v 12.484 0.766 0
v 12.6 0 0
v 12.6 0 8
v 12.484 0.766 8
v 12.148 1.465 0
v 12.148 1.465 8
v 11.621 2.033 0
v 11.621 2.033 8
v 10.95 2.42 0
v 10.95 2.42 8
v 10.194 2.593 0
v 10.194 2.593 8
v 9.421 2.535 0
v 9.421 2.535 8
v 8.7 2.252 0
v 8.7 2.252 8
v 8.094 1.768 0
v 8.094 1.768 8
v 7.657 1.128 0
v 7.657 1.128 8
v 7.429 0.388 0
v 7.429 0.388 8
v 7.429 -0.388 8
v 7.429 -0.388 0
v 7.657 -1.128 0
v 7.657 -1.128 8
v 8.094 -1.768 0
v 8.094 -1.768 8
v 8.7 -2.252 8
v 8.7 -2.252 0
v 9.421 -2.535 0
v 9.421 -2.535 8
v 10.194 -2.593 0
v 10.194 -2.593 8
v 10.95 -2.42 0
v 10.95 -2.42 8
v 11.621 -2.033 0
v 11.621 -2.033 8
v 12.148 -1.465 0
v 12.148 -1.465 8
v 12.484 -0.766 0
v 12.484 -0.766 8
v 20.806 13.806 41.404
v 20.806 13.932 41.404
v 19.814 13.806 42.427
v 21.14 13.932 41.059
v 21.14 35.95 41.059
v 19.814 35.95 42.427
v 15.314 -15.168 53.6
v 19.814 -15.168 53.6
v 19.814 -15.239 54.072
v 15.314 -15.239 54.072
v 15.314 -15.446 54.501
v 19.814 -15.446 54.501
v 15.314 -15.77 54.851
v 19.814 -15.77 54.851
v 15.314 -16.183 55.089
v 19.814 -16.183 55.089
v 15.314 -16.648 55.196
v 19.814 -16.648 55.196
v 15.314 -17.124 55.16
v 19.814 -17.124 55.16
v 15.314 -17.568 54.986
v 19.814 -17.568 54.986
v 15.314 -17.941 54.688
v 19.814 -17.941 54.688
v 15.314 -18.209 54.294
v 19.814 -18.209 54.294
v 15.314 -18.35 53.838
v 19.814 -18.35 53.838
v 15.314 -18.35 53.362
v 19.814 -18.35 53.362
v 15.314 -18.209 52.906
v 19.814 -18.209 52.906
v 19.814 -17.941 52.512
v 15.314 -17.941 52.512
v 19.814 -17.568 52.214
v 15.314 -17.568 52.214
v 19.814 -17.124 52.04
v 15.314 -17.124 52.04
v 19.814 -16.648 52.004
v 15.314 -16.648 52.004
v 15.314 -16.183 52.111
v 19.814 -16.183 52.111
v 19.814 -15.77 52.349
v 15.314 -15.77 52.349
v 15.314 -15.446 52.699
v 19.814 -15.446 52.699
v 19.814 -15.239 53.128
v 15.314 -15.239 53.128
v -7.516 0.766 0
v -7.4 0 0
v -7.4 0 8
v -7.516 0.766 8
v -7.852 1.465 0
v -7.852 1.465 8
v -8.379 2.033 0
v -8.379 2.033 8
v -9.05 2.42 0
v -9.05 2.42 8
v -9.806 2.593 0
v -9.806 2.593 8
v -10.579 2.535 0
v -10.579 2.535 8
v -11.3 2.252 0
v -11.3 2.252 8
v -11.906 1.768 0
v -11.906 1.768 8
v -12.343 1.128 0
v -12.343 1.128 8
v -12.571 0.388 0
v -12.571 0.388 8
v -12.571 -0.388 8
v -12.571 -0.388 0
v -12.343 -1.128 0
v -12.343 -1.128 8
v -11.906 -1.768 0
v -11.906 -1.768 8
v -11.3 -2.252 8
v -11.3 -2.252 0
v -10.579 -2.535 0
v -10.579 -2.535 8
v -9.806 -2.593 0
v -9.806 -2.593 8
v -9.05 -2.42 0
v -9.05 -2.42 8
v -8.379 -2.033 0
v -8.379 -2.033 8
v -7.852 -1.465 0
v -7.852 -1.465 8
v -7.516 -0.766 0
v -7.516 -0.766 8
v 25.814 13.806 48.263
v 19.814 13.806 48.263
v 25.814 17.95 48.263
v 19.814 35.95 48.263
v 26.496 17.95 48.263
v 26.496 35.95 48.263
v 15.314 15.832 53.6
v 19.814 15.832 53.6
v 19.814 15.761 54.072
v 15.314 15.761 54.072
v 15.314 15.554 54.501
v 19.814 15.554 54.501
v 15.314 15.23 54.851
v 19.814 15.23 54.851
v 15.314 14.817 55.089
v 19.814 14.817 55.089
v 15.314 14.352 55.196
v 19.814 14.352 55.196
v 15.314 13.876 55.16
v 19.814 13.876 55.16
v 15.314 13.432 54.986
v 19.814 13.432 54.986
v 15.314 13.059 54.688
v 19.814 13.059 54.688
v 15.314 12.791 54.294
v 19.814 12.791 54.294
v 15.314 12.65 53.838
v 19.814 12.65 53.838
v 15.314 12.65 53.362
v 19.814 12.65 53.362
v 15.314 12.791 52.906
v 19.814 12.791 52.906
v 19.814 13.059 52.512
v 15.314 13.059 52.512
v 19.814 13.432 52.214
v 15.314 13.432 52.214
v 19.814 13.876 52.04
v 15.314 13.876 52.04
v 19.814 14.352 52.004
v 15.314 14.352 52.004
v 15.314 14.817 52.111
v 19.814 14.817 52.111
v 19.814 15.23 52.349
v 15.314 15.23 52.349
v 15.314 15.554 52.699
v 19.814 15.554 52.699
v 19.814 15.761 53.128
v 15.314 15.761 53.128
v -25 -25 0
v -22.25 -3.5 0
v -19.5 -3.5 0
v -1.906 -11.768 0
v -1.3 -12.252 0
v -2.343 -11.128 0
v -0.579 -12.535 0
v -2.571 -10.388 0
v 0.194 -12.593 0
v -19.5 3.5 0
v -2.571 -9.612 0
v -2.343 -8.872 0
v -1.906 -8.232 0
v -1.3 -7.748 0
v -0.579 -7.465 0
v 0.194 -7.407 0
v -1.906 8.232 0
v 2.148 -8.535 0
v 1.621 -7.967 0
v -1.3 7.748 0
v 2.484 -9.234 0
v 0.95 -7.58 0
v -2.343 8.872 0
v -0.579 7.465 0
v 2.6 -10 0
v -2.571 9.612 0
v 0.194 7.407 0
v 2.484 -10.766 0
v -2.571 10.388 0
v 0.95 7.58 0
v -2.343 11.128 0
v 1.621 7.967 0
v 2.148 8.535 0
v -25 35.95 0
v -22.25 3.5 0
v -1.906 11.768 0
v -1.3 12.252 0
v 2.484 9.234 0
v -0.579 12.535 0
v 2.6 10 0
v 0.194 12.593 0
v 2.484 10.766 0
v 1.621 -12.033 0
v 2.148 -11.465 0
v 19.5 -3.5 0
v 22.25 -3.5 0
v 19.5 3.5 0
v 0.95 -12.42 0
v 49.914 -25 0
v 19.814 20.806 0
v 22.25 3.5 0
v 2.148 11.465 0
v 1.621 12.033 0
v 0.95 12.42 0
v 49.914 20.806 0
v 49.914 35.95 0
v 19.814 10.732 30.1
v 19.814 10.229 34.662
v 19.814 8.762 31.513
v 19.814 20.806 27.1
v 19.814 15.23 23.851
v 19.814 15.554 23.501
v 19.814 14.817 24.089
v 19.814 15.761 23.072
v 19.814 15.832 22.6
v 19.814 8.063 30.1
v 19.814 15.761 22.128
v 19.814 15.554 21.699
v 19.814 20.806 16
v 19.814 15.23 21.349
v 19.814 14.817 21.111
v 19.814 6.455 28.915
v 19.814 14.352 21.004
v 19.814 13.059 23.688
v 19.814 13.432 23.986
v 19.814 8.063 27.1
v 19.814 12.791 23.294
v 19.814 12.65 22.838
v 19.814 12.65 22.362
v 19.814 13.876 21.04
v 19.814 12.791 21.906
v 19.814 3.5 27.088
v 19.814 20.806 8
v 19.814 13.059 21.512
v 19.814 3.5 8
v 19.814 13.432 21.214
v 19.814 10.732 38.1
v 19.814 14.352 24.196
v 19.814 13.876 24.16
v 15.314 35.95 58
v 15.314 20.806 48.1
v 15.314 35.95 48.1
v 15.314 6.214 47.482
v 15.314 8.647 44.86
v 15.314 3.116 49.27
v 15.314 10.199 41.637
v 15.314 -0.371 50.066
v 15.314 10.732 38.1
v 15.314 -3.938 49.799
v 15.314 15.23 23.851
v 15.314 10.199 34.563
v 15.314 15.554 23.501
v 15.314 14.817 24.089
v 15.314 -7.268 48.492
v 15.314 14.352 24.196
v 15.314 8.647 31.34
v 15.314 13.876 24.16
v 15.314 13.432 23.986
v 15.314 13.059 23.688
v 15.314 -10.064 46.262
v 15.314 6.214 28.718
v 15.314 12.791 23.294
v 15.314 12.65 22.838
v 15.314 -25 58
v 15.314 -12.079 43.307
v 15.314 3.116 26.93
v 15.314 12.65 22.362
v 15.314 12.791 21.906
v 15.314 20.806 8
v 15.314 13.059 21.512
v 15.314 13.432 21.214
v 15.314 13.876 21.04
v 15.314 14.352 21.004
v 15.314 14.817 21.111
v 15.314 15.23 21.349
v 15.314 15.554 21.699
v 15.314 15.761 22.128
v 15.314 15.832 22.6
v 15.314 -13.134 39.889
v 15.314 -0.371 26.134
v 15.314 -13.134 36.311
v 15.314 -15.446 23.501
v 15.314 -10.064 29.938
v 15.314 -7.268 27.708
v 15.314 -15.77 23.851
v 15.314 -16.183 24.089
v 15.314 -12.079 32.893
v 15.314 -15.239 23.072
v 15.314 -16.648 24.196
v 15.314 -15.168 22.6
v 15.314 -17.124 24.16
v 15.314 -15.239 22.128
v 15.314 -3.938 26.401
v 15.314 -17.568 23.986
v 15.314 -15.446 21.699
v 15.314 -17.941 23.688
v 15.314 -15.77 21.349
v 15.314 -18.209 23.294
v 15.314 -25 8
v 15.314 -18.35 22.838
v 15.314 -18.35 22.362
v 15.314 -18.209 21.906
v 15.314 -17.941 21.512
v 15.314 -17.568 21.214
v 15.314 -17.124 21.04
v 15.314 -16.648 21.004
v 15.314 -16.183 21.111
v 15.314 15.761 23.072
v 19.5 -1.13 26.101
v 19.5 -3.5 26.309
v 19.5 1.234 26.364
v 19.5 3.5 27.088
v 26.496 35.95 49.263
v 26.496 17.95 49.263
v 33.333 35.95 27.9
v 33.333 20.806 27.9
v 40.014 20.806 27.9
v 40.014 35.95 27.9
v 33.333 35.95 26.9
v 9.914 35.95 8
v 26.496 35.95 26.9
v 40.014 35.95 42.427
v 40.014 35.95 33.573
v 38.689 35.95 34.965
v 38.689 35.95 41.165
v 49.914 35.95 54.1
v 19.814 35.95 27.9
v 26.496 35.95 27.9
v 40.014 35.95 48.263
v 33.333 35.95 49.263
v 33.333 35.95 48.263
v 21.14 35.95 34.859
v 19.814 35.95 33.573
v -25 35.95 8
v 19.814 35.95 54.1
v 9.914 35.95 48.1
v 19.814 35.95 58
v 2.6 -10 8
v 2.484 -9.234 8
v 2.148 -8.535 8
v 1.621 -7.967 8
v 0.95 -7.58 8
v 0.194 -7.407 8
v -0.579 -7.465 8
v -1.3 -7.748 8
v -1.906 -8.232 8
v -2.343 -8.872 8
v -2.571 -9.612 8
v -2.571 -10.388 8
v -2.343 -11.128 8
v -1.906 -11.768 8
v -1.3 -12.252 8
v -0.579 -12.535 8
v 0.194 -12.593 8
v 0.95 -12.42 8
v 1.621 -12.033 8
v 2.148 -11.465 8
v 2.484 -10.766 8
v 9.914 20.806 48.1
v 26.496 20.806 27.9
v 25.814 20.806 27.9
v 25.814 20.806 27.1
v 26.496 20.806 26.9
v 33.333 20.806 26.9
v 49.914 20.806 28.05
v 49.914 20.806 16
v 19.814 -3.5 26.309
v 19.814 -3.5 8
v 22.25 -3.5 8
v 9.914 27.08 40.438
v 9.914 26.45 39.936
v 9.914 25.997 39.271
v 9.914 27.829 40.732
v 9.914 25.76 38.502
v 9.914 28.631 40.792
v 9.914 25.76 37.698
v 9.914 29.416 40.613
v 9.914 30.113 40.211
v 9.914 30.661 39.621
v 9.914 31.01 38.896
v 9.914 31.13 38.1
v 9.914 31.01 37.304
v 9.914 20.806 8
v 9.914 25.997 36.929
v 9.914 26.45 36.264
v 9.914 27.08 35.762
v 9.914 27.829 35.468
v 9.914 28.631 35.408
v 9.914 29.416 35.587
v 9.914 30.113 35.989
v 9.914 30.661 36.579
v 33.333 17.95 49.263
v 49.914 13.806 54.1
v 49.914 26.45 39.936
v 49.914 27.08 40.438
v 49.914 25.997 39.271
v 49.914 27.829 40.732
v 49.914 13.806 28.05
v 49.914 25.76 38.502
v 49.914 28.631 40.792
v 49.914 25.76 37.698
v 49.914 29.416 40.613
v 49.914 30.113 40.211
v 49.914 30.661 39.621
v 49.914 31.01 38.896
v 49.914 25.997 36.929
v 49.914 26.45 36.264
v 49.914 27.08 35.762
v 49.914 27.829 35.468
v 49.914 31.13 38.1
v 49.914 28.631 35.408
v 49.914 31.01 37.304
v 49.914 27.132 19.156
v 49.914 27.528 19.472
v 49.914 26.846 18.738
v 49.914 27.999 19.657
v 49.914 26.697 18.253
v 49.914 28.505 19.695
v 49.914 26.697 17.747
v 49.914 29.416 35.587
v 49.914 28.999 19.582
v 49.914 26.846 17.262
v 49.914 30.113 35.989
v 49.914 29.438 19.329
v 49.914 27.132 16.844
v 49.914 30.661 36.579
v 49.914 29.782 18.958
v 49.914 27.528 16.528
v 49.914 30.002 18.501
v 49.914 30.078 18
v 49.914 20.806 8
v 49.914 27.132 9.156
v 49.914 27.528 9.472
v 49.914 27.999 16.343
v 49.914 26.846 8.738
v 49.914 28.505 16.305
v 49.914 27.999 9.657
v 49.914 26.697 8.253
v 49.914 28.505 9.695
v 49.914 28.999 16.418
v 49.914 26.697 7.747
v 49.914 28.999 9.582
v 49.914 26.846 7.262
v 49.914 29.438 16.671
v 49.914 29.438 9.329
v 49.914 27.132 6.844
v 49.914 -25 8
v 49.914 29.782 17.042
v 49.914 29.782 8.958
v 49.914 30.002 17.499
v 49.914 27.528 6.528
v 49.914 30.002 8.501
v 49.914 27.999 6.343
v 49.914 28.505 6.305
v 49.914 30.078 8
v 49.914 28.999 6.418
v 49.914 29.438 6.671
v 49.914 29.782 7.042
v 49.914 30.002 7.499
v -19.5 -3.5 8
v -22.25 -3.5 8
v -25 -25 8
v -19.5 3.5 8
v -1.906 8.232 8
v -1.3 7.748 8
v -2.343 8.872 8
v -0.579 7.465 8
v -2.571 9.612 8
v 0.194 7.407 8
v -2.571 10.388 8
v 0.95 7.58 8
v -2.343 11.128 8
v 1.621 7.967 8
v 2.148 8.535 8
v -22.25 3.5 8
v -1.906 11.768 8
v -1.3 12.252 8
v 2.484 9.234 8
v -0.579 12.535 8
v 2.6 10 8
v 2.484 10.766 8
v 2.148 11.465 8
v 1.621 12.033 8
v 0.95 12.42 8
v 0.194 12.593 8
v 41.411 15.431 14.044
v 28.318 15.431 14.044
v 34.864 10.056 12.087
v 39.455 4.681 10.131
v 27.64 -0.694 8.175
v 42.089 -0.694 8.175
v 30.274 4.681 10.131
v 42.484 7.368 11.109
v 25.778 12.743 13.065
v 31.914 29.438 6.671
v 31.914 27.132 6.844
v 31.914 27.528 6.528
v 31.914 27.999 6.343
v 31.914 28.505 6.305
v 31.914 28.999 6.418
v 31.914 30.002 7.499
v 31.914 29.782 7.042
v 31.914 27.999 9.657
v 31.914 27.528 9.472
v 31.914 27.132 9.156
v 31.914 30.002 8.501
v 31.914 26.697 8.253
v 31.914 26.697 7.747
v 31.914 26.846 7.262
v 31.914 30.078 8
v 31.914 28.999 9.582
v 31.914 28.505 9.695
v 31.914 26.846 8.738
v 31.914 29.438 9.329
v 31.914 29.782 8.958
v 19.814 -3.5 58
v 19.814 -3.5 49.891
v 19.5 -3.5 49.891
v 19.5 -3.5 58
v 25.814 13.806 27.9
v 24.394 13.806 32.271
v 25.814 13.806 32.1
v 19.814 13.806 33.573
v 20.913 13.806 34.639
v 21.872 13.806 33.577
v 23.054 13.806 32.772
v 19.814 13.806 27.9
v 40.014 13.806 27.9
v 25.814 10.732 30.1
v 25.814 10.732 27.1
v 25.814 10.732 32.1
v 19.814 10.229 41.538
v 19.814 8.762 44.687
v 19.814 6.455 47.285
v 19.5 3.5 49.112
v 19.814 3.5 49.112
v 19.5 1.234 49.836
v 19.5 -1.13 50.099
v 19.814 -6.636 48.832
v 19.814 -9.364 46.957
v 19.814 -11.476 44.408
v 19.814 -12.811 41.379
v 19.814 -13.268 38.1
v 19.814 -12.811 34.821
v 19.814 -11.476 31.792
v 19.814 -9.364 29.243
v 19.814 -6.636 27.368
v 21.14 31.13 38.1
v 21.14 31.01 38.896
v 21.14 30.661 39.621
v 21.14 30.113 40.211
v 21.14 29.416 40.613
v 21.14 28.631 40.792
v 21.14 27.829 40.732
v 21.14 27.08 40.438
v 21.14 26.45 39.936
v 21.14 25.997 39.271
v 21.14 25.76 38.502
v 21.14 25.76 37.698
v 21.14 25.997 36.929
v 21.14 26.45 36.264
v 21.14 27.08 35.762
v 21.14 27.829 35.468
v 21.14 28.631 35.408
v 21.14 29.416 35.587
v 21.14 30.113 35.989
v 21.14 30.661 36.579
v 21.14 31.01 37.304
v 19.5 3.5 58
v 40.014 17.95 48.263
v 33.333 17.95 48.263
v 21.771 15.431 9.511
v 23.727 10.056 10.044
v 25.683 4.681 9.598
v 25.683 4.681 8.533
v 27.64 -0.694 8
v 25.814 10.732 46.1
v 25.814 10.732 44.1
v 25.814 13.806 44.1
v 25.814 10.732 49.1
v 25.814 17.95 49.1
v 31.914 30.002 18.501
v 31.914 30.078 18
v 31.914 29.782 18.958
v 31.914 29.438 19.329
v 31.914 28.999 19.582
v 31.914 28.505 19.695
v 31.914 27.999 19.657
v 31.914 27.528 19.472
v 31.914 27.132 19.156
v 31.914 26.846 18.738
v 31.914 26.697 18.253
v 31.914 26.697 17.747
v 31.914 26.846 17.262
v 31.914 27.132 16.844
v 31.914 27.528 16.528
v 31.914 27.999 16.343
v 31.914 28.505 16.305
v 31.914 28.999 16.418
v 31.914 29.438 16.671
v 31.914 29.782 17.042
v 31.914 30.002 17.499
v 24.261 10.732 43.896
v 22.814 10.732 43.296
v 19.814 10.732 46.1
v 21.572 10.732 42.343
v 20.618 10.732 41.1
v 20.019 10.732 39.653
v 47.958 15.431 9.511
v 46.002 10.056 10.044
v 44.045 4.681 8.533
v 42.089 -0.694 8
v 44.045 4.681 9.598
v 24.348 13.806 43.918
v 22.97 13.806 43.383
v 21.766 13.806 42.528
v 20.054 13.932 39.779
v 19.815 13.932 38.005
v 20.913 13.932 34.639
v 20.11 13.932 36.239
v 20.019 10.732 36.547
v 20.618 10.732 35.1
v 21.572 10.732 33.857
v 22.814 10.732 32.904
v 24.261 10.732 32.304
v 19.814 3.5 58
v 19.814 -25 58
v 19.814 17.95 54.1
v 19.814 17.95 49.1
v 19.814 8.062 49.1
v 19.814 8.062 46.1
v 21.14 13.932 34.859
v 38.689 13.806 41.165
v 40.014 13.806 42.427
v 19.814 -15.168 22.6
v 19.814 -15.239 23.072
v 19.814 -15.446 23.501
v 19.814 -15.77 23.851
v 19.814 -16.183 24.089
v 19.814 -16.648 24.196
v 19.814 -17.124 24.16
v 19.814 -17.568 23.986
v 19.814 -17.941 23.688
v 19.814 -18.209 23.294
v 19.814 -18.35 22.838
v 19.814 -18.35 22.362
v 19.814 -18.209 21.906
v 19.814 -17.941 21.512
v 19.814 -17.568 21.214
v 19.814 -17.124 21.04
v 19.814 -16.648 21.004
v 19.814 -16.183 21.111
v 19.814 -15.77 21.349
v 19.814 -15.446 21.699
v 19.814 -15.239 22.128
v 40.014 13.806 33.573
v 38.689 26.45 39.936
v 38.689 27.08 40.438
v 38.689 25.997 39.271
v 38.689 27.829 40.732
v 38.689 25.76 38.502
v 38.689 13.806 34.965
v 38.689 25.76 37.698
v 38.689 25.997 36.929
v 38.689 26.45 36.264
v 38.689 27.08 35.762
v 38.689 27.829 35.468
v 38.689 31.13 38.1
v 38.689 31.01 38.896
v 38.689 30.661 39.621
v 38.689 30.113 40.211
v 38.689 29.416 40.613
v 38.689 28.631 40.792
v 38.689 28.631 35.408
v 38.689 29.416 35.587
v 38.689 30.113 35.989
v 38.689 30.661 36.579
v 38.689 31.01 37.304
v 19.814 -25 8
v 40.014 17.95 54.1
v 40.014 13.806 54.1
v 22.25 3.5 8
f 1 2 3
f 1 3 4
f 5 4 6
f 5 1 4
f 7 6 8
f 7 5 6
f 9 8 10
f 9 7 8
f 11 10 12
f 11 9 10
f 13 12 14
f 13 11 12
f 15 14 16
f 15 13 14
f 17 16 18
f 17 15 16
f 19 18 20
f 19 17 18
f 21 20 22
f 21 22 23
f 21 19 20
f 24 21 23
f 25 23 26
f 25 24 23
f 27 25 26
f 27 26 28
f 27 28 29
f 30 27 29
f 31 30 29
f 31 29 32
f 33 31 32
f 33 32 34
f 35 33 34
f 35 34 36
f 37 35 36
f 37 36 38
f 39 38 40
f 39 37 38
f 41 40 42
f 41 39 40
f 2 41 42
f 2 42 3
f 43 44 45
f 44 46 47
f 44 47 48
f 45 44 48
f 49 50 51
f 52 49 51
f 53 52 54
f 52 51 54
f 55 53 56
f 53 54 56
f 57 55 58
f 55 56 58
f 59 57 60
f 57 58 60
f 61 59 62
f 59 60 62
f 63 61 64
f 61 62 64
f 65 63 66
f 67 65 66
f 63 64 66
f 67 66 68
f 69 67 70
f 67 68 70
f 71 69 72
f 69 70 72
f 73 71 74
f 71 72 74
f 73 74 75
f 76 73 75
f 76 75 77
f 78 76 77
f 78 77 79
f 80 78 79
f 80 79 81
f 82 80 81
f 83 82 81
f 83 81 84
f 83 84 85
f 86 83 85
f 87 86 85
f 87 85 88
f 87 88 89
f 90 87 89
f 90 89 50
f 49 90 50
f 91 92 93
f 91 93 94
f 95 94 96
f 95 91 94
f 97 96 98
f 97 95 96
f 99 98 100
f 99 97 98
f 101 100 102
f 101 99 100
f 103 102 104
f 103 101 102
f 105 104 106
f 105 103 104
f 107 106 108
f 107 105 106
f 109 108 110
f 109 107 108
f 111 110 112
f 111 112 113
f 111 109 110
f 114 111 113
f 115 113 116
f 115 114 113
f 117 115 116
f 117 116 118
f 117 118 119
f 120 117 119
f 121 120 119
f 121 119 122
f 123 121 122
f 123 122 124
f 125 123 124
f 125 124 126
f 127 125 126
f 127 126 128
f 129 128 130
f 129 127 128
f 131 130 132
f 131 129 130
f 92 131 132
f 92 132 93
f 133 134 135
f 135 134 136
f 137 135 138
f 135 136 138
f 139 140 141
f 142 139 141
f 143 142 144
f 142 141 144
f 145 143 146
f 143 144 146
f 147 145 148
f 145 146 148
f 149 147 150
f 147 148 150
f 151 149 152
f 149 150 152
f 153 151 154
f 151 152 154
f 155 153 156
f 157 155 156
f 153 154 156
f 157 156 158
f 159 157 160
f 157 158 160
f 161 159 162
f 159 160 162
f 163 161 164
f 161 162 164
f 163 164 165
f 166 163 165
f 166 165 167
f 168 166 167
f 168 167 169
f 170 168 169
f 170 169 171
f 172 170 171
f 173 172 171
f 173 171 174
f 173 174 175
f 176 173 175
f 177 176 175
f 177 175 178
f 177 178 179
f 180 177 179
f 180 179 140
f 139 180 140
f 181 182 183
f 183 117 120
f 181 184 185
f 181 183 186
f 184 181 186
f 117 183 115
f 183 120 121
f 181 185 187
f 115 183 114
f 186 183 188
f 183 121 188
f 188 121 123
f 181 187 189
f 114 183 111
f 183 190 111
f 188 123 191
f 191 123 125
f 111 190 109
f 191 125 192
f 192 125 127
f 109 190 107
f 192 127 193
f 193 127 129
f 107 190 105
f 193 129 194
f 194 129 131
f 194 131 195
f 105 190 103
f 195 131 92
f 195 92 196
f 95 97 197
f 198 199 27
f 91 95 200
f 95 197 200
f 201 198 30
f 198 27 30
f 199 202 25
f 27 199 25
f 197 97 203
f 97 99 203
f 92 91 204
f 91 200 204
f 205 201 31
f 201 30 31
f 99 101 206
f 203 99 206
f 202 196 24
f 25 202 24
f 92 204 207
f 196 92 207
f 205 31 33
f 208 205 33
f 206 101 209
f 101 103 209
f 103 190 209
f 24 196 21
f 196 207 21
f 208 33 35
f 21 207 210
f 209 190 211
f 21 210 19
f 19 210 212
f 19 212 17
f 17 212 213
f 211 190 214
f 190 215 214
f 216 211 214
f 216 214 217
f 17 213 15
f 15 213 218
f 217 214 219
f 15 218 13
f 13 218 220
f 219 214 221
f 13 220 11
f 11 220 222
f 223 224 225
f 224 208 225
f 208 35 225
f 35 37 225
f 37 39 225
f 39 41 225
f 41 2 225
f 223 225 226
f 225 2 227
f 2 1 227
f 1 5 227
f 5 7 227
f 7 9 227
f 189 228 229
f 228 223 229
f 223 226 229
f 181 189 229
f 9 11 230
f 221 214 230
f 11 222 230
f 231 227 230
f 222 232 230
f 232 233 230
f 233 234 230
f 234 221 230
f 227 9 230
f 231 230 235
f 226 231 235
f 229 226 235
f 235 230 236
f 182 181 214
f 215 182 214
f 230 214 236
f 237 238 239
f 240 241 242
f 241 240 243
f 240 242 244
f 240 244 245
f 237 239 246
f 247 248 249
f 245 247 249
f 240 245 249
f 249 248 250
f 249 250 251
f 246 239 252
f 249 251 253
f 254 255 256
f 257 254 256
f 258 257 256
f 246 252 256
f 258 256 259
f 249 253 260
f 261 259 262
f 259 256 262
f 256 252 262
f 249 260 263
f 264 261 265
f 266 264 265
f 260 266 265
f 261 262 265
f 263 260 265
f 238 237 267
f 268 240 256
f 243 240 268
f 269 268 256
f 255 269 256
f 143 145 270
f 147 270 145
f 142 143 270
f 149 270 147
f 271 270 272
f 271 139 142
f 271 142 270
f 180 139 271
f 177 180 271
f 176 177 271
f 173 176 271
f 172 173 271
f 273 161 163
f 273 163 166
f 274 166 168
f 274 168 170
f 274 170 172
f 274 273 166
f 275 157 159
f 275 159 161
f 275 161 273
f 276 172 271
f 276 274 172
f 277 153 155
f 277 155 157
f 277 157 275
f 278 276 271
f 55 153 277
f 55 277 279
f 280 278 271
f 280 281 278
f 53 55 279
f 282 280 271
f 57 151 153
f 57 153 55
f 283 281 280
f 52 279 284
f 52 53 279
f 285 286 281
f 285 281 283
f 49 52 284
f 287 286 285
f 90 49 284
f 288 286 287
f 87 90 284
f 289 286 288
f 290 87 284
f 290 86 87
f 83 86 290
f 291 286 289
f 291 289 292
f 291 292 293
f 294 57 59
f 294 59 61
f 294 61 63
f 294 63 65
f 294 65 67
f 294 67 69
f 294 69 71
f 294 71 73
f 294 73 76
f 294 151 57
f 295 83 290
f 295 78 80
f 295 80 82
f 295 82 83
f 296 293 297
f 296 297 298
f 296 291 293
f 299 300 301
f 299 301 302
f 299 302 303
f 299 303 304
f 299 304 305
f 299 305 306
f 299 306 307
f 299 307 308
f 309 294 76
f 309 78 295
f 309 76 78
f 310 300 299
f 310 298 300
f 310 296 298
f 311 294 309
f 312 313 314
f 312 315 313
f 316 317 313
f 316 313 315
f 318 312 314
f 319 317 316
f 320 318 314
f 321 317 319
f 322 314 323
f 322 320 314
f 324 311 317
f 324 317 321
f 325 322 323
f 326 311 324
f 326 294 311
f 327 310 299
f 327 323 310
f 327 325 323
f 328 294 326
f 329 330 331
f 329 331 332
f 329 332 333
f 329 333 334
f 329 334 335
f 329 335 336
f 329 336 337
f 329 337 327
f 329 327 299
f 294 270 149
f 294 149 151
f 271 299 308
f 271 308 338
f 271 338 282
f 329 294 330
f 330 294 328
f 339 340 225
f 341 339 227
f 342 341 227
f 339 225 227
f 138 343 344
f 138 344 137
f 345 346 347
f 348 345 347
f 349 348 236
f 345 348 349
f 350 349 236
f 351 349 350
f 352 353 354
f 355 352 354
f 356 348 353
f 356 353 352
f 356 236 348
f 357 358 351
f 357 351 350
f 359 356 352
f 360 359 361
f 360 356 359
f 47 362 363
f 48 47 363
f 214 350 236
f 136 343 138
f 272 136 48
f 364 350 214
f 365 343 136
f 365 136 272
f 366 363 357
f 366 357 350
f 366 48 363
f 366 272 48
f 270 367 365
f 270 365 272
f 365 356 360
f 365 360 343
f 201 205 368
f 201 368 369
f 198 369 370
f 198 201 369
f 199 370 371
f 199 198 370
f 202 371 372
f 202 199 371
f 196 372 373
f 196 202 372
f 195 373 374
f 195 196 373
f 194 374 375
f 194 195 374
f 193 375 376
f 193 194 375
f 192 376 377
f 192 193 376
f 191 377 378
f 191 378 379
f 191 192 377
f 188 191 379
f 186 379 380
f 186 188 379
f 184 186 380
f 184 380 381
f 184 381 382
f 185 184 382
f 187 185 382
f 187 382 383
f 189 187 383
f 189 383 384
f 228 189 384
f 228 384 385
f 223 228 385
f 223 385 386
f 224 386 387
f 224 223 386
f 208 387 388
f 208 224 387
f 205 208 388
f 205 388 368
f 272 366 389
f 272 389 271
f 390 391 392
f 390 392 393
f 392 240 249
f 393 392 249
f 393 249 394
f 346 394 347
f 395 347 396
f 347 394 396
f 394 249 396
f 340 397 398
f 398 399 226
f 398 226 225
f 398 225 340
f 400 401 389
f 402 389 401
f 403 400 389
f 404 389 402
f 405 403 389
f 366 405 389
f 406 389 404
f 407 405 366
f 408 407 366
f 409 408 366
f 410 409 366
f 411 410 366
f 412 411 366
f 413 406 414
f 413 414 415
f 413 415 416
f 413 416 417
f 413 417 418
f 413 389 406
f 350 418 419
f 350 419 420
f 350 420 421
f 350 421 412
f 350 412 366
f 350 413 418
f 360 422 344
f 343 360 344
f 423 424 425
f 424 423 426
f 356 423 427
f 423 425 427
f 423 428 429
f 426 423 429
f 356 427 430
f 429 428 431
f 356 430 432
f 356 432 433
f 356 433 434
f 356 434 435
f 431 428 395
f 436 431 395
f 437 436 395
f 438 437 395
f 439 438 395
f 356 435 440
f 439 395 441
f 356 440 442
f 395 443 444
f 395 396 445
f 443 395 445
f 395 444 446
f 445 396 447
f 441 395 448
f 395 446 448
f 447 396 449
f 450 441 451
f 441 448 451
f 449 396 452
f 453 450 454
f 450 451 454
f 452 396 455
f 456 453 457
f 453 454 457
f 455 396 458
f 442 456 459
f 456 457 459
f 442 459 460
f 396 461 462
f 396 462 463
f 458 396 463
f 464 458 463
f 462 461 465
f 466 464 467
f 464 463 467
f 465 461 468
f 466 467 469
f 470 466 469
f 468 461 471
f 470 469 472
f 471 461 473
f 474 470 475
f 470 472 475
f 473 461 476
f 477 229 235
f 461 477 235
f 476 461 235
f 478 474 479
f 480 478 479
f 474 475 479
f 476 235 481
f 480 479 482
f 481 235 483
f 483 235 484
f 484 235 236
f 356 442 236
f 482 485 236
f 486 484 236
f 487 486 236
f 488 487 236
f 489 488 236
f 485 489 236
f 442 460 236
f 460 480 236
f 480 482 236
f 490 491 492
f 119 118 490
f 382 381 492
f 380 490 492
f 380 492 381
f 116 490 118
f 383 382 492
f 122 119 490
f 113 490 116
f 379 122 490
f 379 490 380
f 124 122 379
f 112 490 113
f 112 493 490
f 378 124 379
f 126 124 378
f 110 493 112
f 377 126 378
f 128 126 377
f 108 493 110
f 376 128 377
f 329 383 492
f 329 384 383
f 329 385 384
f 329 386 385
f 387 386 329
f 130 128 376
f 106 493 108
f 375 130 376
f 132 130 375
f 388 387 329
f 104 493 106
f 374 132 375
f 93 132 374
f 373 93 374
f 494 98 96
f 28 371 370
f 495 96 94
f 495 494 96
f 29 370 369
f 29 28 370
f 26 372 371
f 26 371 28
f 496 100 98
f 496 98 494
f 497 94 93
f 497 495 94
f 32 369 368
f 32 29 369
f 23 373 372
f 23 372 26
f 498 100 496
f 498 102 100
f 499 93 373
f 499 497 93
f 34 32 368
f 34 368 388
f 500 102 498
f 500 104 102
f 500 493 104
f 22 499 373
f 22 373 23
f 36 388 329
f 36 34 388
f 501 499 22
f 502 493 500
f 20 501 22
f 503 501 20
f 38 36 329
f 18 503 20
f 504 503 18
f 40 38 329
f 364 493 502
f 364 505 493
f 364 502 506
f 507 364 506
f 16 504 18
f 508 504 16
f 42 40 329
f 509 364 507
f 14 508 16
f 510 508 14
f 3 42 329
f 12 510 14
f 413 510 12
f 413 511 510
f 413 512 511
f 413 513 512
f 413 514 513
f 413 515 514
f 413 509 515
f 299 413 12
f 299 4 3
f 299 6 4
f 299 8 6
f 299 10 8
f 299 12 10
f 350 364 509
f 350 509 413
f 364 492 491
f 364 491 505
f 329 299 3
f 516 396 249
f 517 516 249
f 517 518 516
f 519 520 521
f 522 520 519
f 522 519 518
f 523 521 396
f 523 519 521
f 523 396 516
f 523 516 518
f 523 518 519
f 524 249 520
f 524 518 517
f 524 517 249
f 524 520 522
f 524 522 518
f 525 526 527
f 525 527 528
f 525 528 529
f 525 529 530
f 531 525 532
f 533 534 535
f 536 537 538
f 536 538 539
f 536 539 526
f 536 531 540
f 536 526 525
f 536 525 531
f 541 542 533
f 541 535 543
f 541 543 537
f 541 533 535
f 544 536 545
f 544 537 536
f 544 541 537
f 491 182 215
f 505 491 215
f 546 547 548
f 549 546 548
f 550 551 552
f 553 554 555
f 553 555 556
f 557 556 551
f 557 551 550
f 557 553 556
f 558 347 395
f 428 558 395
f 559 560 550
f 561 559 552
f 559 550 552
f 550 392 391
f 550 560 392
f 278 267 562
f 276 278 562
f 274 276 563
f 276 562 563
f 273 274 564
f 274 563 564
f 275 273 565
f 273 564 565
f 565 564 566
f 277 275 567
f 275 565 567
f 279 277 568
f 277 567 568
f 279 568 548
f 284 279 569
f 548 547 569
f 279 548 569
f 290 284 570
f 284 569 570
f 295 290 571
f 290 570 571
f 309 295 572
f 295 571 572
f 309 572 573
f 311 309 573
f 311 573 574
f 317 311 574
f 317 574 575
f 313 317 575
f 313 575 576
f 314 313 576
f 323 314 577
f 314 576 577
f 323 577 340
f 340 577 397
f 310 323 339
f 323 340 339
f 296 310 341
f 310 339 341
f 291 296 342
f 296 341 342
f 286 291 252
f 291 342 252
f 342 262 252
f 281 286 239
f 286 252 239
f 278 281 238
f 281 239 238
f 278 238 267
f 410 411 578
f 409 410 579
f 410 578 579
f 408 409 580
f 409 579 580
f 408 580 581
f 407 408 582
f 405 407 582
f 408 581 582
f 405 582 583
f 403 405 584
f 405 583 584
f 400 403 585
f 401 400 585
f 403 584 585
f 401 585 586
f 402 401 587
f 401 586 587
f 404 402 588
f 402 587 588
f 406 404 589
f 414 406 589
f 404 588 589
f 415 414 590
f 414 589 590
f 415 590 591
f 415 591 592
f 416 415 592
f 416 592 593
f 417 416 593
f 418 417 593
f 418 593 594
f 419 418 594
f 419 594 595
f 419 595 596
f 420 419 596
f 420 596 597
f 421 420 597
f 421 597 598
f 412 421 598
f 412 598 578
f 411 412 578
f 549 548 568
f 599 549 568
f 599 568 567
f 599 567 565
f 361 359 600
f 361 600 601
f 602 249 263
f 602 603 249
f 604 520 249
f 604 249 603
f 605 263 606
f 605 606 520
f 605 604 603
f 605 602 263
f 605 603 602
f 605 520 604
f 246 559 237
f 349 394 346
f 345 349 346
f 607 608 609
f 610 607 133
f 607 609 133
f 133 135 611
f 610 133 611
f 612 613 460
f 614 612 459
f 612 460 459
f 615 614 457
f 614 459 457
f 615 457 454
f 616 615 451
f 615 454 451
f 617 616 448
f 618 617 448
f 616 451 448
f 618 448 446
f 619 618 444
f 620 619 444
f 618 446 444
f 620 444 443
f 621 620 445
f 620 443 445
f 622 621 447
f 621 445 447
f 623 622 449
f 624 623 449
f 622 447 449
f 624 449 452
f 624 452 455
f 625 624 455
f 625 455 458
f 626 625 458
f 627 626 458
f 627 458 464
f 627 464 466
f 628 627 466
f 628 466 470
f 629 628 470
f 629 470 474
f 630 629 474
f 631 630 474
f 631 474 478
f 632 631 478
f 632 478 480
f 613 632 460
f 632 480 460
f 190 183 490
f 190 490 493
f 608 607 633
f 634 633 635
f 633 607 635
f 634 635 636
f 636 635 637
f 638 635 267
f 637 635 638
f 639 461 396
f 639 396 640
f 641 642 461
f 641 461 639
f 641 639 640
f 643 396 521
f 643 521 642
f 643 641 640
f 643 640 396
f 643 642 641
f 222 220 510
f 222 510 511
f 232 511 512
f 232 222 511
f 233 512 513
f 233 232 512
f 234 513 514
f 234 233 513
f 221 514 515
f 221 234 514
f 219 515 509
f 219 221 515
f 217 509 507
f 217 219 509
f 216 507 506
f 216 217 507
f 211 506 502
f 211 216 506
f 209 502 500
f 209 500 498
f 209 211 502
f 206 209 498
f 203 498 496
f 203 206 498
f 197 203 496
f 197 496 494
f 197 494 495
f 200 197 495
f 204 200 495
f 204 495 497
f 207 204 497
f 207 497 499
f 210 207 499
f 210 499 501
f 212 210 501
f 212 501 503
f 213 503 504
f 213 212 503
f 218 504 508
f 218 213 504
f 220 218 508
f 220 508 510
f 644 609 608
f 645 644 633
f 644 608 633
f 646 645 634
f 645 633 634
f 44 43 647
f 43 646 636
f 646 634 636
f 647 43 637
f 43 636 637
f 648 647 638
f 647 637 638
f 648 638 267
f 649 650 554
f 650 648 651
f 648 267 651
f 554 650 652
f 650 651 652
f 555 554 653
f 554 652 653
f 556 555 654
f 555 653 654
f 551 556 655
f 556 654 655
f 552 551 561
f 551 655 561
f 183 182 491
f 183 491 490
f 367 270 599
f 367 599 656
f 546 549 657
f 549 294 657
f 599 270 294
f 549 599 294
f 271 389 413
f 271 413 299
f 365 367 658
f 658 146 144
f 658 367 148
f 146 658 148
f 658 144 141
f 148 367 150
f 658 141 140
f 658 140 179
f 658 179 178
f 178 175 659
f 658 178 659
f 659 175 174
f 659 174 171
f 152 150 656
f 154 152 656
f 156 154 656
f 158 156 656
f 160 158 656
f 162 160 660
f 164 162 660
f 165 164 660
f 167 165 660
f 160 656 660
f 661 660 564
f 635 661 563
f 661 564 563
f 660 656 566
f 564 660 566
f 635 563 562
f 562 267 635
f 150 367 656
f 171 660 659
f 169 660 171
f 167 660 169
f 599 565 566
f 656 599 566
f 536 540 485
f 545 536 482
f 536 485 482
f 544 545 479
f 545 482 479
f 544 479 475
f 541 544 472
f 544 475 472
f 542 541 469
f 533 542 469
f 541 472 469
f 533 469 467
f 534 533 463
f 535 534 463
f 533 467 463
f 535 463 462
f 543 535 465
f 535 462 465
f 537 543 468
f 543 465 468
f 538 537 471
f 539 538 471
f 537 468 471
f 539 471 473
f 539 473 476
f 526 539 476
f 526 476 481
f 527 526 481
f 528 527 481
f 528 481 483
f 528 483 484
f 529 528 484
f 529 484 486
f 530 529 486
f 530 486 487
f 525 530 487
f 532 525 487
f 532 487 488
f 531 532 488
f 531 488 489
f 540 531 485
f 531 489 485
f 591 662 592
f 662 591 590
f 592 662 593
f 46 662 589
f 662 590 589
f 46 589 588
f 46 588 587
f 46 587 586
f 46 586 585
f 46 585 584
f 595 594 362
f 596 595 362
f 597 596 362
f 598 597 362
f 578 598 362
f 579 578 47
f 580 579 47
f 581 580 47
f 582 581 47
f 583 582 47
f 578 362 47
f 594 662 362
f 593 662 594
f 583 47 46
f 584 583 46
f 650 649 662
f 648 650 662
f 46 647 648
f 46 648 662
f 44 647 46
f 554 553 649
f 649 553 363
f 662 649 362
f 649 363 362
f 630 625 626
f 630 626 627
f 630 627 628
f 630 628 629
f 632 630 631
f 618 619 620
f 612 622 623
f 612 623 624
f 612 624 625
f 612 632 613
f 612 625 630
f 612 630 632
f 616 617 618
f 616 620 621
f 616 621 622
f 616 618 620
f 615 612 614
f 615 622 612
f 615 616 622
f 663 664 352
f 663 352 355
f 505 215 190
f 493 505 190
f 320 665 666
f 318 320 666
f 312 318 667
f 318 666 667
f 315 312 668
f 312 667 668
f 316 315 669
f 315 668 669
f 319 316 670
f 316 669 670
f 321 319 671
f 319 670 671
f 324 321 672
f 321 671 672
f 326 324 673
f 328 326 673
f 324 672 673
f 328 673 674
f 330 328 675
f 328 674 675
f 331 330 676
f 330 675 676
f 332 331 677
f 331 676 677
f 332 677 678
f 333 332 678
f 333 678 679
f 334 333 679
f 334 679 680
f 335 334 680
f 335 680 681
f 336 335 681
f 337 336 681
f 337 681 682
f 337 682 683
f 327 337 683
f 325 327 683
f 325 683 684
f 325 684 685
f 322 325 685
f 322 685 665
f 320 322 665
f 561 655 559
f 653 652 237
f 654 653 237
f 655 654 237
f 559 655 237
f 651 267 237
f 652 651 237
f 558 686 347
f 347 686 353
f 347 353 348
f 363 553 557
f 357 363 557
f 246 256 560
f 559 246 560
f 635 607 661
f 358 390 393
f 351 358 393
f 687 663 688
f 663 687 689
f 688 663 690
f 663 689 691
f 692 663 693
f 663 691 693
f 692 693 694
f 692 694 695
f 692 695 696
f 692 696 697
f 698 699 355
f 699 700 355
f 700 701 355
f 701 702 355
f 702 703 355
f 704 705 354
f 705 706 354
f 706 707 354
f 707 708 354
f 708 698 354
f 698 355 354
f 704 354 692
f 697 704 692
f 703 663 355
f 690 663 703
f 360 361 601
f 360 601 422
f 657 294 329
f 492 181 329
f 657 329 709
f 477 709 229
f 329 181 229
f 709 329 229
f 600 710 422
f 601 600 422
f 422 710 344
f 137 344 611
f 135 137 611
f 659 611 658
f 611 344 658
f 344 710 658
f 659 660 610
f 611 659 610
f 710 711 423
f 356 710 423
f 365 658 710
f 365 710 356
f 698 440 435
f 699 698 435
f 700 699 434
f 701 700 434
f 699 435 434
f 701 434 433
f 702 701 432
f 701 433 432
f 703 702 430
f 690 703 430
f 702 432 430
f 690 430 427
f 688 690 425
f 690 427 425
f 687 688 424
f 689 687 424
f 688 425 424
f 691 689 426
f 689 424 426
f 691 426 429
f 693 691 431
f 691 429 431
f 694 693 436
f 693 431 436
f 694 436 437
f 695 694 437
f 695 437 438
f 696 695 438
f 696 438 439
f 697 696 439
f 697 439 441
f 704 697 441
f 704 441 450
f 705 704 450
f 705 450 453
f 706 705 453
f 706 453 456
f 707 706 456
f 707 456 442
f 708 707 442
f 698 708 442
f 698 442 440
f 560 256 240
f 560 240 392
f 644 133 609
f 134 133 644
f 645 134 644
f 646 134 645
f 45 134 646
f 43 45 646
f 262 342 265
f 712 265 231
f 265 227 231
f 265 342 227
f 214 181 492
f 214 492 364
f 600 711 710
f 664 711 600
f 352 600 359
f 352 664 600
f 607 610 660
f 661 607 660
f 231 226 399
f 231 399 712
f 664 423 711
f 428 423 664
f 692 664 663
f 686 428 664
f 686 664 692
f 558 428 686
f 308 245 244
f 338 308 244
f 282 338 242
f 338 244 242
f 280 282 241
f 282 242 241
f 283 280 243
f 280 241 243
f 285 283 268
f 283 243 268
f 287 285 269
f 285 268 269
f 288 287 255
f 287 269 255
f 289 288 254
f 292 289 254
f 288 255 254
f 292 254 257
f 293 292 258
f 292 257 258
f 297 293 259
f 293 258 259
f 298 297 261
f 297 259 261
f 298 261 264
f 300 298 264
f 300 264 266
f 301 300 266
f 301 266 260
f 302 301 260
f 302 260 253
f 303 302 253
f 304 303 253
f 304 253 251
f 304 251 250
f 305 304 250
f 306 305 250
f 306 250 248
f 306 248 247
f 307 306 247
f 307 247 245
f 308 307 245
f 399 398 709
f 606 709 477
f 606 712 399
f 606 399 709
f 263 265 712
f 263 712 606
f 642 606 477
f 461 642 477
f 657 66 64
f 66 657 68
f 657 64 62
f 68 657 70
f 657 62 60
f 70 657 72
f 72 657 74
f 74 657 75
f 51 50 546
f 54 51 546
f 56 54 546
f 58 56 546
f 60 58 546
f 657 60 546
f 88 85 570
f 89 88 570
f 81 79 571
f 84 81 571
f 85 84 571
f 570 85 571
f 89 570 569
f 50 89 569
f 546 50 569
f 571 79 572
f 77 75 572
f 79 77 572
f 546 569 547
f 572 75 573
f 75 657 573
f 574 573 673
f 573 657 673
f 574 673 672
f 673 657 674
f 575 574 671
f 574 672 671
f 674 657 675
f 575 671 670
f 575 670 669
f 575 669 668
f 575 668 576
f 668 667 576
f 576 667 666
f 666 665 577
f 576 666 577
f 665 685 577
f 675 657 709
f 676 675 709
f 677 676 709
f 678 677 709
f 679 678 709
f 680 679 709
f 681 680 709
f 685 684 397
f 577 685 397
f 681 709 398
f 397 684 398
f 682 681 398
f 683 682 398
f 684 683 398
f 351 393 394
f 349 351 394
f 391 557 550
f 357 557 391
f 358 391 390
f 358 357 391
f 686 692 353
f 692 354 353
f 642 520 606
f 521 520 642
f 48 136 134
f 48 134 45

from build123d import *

# Parameters (mm, degrees)
SKETCH007_W         = 74.914368
SKETCH007_H         = 60.949894
SKETCH007_R         = 2.6
SKETCH007_W_2       = 2.75
SKETCH007_H_2       = 7
PAD005_DEPTH        = 8
SKETCH009_W         = 40
SKETCH009_H         = 15.144356
PAD006_DEPTH        = 40.1
POCKET004_DEPTH     = 50
PAD007_DEPTH        = 50
PAD008_DEPTH        = 7
PAD009_DEPTH        = 7
SKETCH012_R         = 2.7
POCKET005_DEPTH     = 1000
SKETCH014_R         = 12
SKETCH014_R_2       = 1.6
POCKET006_DEPTH     = 5
SKETCH015_W         = 30.1
SKETCH015_H         = 16
PAD010_DEPTH        = 21.5
PAD010_TAPER        = 20
PAD010_FACE47_W     = 4.5
PAD010_FACE47_H     = 9.9
PAD011_DEPTH        = 16
PAD011_FACE21_W     = 0.855644
PAD011_FACE21_H     = 4.5
POCKET007_DEPTH     = 20
SKETCH016_R         = 1.7
POCKET008_DEPTH     = 18
LINEARPATTERN_COUNT = 2
LINEARPATTERN_PITCH = 10
PAD015_DEPTH        = 6
PAD016_DEPTH        = 3
PAD017_DEPTH        = 3
SKETCH027_R         = 6
POCKET010_DEPTH     = 3.2
POCKET010_FACE26_W  = 22.144356
POCKET010_FACE26_H  = 9.9
PAD018_DEPTH        = 6
PAD_DEPTH           = 18
SKETCH_W            = 6
SKETCH_H            = 0.836678
PAD019_DEPTH        = 7
SKETCH029_W         = 6
SKETCH029_H         = 0.8
PAD020_DEPTH        = 10


with BuildPart() as part:
    # Sketch007 → Pad005 (new body)
    with BuildSketch(Plane.XY):
        with Locations((12.457184, 5.474947)):
            Rectangle(SKETCH007_W, SKETCH007_H)
        with Locations((0, 10)):
            Circle(SKETCH007_R, mode=Mode.SUBTRACT)
        with Locations((10, 0)):
            Circle(SKETCH007_R, mode=Mode.SUBTRACT)
        with Locations((-10, 0)):
            Circle(SKETCH007_R, mode=Mode.SUBTRACT)
        with Locations((0, -10)):
            Circle(SKETCH007_R, mode=Mode.SUBTRACT)
        with Locations((20.875, 0)):
            Rectangle(SKETCH007_W_2, SKETCH007_H_2, mode=Mode.SUBTRACT)
        with Locations((-20.875, 0)):
            Rectangle(SKETCH007_W_2, SKETCH007_H_2, mode=Mode.SUBTRACT)
    extrude(amount=PAD005_DEPTH)

    # Sketch009 (on Face18 of Pad005) → Pad006 (join)
    with BuildSketch(Plane.XY.offset(8)):
        with Locations((29.914368, 28.377716)):
            Rectangle(SKETCH009_W, SKETCH009_H)
    extrude(amount=PAD006_DEPTH)

    # Sketch010 (on Face19 of Pad006) → Pocket004 (cut)
    with BuildSketch(Plane.XZ.offset(-20.805538)):
        Polygon((19.814368, 48.1), (19.814368, 42.426645), (21.140392, 41.059428), (21.140392, 34.859428), (19.814368, 33.573355), (19.814368, 27.9), (26.496015, 27.9), (26.496015, 26.9), (33.332721, 26.9), (33.332721, 27.9), (40.014368, 27.9), (40.014368, 33.573355), (38.689334, 34.965349), (38.689334, 41.165349), (40.014368, 42.426645), (40.014368, 48.1), align=None)
    extrude(amount=-POCKET004_DEPTH, mode=Mode.SUBTRACT)

    # Sketch011 (on Face5 of Pocket004) → Pad007 (join)
    with BuildSketch(Plane.XY.offset(8)):
        Polygon((15.314368, 20.805538), (15.314368, -25), (19.814368, -25), (19.814368, -3.5), (19.5, -3.5), (19.5, 3.5), (19.814368, 3.5), (19.814368, 20.805538), align=None)
    extrude(amount=PAD007_DEPTH)

    # Sketch013 (on Face34 of Pad007) → Pad008 (join)
    with BuildSketch(Plane.XZ.offset(-20.805538)):
        Polygon((40.014368, 48.1), (40.014368, 42.426645), (38.689334, 41.165349), (38.689334, 34.965349), (40.014368, 33.573355), (40.014368, 27.9), (49.914368, 28.05), (49.914368, 48.1), align=None)
    extrude(amount=PAD008_DEPTH)

    # Pad008 Face35 → Pad009 (add)
    with BuildSketch(Plane(origin=(20.438426, 20.805538, 37.980906), x_dir=(-1, 0, 0), z_dir=(0, -1, 0))):
        Polygon((0.624058, 4.407551), (-0.701966, 3.121478), (-0.701966, -3.078522), (0.624058, -4.445739), align=None)
    extrude(amount=PAD009_DEPTH)

    # Sketch012 (on Face5 of Pad007) → Pocket005 (cut)
    with BuildSketch(Plane.YZ.offset(49.914368)):
        with Locations((28.429679, 38.1)):
            Circle(SKETCH012_R)
    extrude(amount=-POCKET005_DEPTH, mode=Mode.SUBTRACT)

    # Sketch014 (on Face25 of Pocket005) → Pocket006 (cut)
    with BuildSketch(Plane.YZ.offset(19.814368)):
        with Locations((-1.267852, 38.1)):
            Circle(SKETCH014_R)
        with Locations((-16.767852, 53.6)):
            Circle(SKETCH014_R_2)
        with Locations((14.232148, 53.6)):
            Circle(SKETCH014_R_2)
        with Locations((14.232148, 22.6)):
            Circle(SKETCH014_R_2)
        with Locations((-16.767852, 22.6)):
            Circle(SKETCH014_R_2)
    extrude(amount=-POCKET006_DEPTH, mode=Mode.SUBTRACT)

    # Sketch015 (on Face41 of Pocket006) → Pad010 (join)
    with BuildSketch(Plane.XZ.offset(-20.805538)):
        with Locations((34.864368, 8)):
            Rectangle(SKETCH015_W, SKETCH015_H)
    extrude(amount=PAD010_DEPTH, taper=PAD010_TAPER)

    # Pad010 Face47 → Pad011 (add)
    with BuildSketch(Plane(origin=(17.564368, 20.805538, 53.05), x_dir=(1, 0, 0), z_dir=(0, 1, 0))):
        Rectangle(PAD010_FACE47_W, PAD010_FACE47_H)
    extrude(amount=PAD011_DEPTH)

    # Pad011 Face21 → Pocket007 (cut)
    with BuildSketch(Plane(origin=(17.564368, 36.377716, 48.1), x_dir=(0, -1, 0), z_dir=(0, 0, -1))):
        Rectangle(PAD011_FACE21_W, PAD011_FACE21_H)
    extrude(amount=-POCKET007_DEPTH, mode=Mode.SUBTRACT)

    # Sketch016 (on Face5 of Pocket007) → Pocket008 (cut)
    with BuildSketch(Plane.YZ.offset(49.914368)):
        with Locations((28.377716, 8)):
            Circle(SKETCH016_R)
    pocket008 = extrude(amount=-POCKET008_DEPTH, mode=Mode.SUBTRACT)

    # LinearPattern: Pocket008 ×2
    with Locations(*[(0, 0, i * LINEARPATTERN_PITCH) for i in range(1, LINEARPATTERN_COUNT)]):
        add(pocket008, mode=Mode.SUBTRACT)

    # Sketch021 (on Face11 of LinearPattern) → Pad015 (join)
    with BuildSketch(Plane.YZ.offset(19.814368)):
        Polygon((10.732148, 38.1), (10.732148, 49.1), (13.805538, 49.1), (13.805538, 27.1), (10.732148, 27.1), align=None)
    extrude(amount=PAD015_DEPTH)

    # Sketch025 (on Face62 of Pad015) → Pad016 (join)
    with BuildSketch(Plane(origin=(0, 0, 27.1), x_dir=(1, 0, 0), z_dir=(0, 0, -1))):
        Polygon((25.814368, -10.732148), (19.814368, -10.732148), (19.814368, -8.062612), align=None)
    extrude(amount=-PAD016_DEPTH)

    # Sketch026 (on Face59 of Pad016) → Pad017 (join)
    with BuildSketch(Plane.XY.offset(49.1)):
        Polygon((19.814368, 10.732148), (25.814368, 10.732148), (19.814368, 8.062148), align=None)
    extrude(amount=-PAD017_DEPTH)

    # Sketch027 (on Face61 of Pad017) → Pocket010 (cut)
    with BuildSketch(Plane.XZ.offset(-10.732148)):
        with Locations((25.814368, 38.1)):
            Circle(SKETCH027_R)
    extrude(amount=-POCKET010_DEPTH, mode=Mode.SUBTRACT)

    # Pocket010 Face26 → Pad018 (add)
    with BuildSketch(Plane(origin=(44.964368, 24.877716, 48.1), x_dir=(0, 1, 0), z_dir=(0, 0, 1))):
        Rectangle(POCKET010_FACE26_W, POCKET010_FACE26_H)
    extrude(amount=PAD018_DEPTH)

    # Sketch028 (on Face68 of Pad018) → Pad (join)
    with BuildSketch(Plane(origin=(0, 35.949894, 0), x_dir=(-1, 0, 0), z_dir=(0, 1, 0))):
        Polygon((-40.014368, 48.263322), (-33.332721, 48.263322), (-33.332721, 49.263322), (-26.496015, 49.263322), (-26.496015, 48.263322), (-19.814368, 48.263322), (-19.814368, 54.1), (-40.014368, 54.1), align=None)
    extrude(amount=-PAD_DEPTH)

    # Sketch (on Face49 of Pad) → Pad019 (join)
    with BuildSketch(Plane.XZ.offset(-17.949894)):
        with Locations((22.814368, 48.681661)):
            Rectangle(SKETCH_W, SKETCH_H)
    extrude(amount=PAD019_DEPTH)

    # Sketch029 (on Face63 of Pad019) → Pad020 (join)
    with BuildSketch(Plane.XZ.offset(-20.805538)):
        with Locations((22.814368, 27.5)):
            Rectangle(SKETCH029_W, SKETCH029_H)
    extrude(amount=PAD020_DEPTH)


solid = part.part
